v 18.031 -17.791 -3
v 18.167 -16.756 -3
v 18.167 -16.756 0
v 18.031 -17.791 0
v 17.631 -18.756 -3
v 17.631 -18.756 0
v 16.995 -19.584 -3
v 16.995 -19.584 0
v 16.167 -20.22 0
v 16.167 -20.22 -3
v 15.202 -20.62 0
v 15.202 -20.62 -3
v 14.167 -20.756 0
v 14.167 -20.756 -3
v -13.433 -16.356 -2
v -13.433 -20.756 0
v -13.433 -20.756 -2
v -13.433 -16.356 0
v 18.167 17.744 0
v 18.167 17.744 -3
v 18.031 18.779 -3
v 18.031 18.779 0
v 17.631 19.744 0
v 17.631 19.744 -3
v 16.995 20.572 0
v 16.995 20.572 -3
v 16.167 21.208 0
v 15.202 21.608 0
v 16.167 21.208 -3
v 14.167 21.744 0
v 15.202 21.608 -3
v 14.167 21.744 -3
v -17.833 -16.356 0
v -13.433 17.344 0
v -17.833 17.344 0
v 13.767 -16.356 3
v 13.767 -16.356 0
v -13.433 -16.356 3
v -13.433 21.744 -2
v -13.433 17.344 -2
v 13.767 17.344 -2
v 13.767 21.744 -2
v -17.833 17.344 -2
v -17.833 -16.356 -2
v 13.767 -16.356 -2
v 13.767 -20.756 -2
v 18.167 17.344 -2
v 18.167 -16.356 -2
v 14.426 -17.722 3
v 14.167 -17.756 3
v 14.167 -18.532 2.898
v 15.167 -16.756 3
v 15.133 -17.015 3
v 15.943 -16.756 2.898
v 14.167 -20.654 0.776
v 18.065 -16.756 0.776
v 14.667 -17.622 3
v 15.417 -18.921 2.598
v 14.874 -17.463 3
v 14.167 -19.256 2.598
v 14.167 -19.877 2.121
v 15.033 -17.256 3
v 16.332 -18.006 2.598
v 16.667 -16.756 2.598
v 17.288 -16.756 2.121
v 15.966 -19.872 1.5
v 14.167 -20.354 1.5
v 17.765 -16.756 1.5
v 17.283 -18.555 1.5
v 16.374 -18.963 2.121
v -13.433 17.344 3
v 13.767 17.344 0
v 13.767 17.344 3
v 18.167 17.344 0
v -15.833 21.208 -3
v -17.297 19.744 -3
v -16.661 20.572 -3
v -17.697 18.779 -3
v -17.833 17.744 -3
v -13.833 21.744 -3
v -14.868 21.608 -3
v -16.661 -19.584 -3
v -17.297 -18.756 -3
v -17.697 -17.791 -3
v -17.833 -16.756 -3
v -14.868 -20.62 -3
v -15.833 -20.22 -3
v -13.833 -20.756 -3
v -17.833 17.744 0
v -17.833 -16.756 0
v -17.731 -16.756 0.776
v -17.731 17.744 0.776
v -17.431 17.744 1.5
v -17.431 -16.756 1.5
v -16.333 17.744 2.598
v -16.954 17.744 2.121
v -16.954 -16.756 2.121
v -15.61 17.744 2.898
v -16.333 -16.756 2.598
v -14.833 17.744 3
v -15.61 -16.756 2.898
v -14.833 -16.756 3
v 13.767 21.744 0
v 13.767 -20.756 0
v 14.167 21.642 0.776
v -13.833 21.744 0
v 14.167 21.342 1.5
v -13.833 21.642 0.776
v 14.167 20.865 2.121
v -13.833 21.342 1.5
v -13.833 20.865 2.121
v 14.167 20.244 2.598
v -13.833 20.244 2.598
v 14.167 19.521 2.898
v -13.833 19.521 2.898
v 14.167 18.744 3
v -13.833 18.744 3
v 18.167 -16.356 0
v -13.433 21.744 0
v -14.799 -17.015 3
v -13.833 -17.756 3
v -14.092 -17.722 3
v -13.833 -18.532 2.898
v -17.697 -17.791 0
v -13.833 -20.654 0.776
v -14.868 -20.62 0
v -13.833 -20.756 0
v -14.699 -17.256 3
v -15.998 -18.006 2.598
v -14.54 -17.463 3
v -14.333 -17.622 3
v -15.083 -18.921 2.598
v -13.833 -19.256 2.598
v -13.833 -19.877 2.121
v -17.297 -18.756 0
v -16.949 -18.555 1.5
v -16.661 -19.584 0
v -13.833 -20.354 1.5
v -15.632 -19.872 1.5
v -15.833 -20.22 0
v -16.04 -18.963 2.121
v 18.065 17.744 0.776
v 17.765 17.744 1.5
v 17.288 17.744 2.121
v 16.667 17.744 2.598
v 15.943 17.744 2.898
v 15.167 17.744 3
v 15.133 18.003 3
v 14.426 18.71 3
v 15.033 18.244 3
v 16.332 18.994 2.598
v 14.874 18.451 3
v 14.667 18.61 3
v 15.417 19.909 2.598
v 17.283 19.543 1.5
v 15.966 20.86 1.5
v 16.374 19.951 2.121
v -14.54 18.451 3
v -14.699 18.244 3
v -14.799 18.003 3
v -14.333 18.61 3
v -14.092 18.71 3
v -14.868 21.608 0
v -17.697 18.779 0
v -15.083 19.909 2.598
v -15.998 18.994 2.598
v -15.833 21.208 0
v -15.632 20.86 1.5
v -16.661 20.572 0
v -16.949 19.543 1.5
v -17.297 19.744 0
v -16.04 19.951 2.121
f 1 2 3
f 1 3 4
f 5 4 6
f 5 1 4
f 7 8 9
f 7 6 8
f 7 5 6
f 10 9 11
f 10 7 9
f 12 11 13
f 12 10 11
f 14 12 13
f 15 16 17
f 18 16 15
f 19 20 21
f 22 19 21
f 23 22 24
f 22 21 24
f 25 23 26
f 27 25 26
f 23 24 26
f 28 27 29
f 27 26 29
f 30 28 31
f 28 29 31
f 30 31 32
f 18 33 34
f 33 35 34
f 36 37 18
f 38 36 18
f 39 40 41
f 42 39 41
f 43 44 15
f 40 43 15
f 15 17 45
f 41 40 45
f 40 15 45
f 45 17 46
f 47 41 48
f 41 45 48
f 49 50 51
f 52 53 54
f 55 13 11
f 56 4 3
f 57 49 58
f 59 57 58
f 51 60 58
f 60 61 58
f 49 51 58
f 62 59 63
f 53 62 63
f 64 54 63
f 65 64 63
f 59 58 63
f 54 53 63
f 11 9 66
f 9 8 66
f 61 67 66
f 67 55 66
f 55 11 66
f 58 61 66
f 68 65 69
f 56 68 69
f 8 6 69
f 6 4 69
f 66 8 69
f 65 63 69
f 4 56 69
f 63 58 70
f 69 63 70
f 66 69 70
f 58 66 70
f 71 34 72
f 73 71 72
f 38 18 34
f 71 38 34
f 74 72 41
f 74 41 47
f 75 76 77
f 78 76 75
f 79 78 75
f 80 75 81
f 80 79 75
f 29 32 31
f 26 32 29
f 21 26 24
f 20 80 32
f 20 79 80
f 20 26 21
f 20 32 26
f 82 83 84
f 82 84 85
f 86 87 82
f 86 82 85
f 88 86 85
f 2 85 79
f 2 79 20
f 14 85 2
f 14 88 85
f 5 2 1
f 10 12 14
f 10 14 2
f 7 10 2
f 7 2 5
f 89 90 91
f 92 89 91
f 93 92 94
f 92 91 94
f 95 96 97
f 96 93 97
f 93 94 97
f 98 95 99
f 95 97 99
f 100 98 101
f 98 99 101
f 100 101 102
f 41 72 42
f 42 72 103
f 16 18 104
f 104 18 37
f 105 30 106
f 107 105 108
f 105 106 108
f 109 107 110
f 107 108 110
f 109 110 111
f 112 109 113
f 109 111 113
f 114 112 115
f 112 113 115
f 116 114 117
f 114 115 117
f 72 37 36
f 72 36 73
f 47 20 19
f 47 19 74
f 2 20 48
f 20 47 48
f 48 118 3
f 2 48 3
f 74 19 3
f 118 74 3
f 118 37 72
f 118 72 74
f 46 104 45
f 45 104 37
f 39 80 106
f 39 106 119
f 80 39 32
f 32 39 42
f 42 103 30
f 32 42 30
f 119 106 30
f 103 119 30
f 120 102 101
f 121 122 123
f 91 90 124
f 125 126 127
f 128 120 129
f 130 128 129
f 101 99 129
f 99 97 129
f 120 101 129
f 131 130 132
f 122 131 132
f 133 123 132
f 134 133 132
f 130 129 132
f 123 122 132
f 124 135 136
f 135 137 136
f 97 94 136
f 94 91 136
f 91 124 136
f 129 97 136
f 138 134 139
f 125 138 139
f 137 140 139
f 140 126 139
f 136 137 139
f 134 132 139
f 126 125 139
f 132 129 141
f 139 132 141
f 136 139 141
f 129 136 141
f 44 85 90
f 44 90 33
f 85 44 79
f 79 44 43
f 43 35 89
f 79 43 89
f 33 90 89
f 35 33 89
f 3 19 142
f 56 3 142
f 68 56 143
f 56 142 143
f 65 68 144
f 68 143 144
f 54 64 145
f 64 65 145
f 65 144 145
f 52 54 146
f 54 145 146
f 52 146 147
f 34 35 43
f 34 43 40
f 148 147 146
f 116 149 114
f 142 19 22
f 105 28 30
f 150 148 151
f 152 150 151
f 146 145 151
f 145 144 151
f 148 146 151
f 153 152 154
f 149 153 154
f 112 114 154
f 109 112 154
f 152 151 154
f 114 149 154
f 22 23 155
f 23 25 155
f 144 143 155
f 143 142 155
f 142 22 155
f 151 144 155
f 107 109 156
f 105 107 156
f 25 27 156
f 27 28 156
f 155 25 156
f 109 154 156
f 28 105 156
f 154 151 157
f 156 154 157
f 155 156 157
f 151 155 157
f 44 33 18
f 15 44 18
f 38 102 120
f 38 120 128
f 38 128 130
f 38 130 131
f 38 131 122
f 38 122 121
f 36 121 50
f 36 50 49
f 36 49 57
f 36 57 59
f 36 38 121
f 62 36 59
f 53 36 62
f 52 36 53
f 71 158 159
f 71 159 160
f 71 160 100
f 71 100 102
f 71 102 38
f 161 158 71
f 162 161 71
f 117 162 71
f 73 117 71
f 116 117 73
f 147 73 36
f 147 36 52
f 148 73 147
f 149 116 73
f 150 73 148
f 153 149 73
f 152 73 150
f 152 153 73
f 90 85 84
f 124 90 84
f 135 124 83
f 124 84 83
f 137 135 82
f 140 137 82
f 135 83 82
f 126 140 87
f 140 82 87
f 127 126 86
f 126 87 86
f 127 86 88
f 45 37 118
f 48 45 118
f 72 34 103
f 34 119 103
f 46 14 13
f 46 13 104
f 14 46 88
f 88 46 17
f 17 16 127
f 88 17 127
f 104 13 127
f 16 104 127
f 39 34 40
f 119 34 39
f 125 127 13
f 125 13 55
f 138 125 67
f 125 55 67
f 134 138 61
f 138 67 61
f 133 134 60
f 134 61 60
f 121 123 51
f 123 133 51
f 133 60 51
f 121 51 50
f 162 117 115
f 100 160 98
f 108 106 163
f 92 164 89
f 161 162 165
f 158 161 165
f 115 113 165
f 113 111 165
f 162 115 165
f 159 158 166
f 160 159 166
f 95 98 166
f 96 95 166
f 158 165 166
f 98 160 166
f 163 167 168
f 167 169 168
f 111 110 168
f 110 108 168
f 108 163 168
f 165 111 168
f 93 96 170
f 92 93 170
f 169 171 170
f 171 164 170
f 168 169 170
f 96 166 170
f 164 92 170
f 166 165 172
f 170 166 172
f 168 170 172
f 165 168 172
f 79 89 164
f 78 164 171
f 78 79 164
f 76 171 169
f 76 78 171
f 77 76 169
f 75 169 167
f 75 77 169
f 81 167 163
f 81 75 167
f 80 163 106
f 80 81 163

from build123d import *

# Parameters (mm, degrees)
F0_W         = 27.2
F0_H         = 4.4
F0_W_2       = 4.4
F0_H_2       = 33.7
F1_DEPTH     = 3
F2_R         = 2.99999
F3_DEPTH     = 2
F4_W         = 4.4
F4_H         = 4.4
F5_DEPTH     = 1
F6_T1_DEPTH  = 16
F6_T4_ANGLE  = 90
F6_T6_ANGLE  = 90
F6_T8_ANGLE  = 90
F6_T10_ANGLE = 90


# Not quite as in the source:
# - a fillet or chamfer that OpenCascade refuses, or shapes differently, is made with other operations: its cross-section is extruded or revolved along the edge and cut away or added
# - a fillet or chamfer is up to 0.001 mm smaller than in the source, because OpenCascade refuses the exact size


with BuildPart() as f1:
    # F0 (on Top) → F1 (new body)
    with BuildSketch(Plane.XY):
        with Locations((0.1669520199, 19.5440534235)):
            Rectangle(F0_W, F0_H)
        with Locations((-15.6330479801, 0.4940534235)):
            Rectangle(F0_W_2, F0_H_2)
        with Locations((-15.6330479801, 19.5440534235)):
            Rectangle(F0_W_2, F0_H)
        with Locations((-15.6330479801, -18.5559465765)):
            Rectangle(F0_W_2, F0_H)
        with Locations((0.1669520199, -18.5559465765)):
            Rectangle(F0_W, F0_H)
        with Locations((15.9669520199, -18.5559465765)):
            Rectangle(F0_W_2, F0_H)
        with Locations((15.9669520199, 0.4940534235)):
            Rectangle(F0_W_2, F0_H_2)
        with Locations((15.9669520199, 19.5440534235)):
            Rectangle(F0_W_2, F0_H)
    extrude(amount=F1_DEPTH)

    # F2 (radius 3 in the source; OpenCascade refuses exactly that, so slightly less here)
    f2_edges = [f1.edges().sort_by_distance(p)[0] for p in [
        (18.166952, 0.494053, 3),
        (0.166952, 21.744053, 3),
        (-17.833048, 0.494053, 3),
        (0.166952, -20.755947, 3),
    ]]
    fillet(f2_edges, radius=F2_R)

    # F0 (on Top) → F3 (join)
    with BuildSketch(Plane.XY):
        with Locations((-15.6330479801, -18.5559465765)):
            Rectangle(F0_W_2, F0_H)
        with Locations((15.9669520199, -18.5559465765)):
            Rectangle(F0_W_2, F0_H)
        with Locations((15.9669520199, 19.5440534235)):
            Rectangle(F0_W_2, F0_H)
        with Locations((-15.6330479801, 19.5440534235)):
            Rectangle(F0_W_2, F0_H)
    extrude(amount=-F3_DEPTH)

    # F4 (on face) → F5 (join)
    with BuildSketch(Plane(origin=(0, 0, -2), x_dir=(1, 0, 0), z_dir=(0, 0, -1))):
        Polygon((-13.4330479801, -21.7440534235), (18.1669520199, -21.7440534235), (18.1669520199, 20.7559465765), (-17.8330479801, 20.7559465765), (-17.8330479801, -17.3440534235), (-13.4330479801, -17.3440534235), align=None)
        with Locations((-15.6330479801, -19.5440534235)):
            Rectangle(F4_W, F4_H)
    extrude(amount=F5_DEPTH)

    # F6: fillet of radius 4 on 4 edges, made by hand

    # F6_s2 → F6_t1 (cut)
    with BuildSketch(Plane.XY.offset(-13)):
        with BuildLine():
            ThreePointArc((18.1669520199, 17.7440534235), (16.9953791447, 20.5724805482), (14.1669520199, 21.7440534235))
            Line((14.1669520199, 21.7440534235), (18.1669520199, 21.7440534235))
            Line((18.1669520199, 21.7440534235), (18.1669520199, 17.7440534235))
        make_face()
        with BuildLine():
            ThreePointArc((18.1669520199, -16.7559465765), (16.9953791447, -19.5843737013), (14.1669520199, -20.7559465765))
            Line((14.1669520199, -20.7559465765), (18.1669520199, -20.7559465765))
            Line((18.1669520199, -20.7559465765), (18.1669520199, -16.7559465765))
        make_face()
        with BuildLine():
            ThreePointArc((-17.8330479801, -16.7559465765), (-16.6614751048, -19.5843737013), (-13.8330479801, -20.7559465765))
            Line((-13.8330479801, -20.7559465765), (-17.8330479801, -20.7559465765))
            Line((-17.8330479801, -20.7559465765), (-17.8330479801, -16.7559465765))
        make_face()
        with BuildLine():
            ThreePointArc((-17.8330479801, 17.7440534235), (-16.6614751048, 20.5724805482), (-13.8330479801, 21.7440534235))
            Line((-13.8330479801, 21.7440534235), (-17.8330479801, 21.7440534235))
            Line((-17.8330479801, 21.7440534235), (-17.8330479801, 17.7440534235))
        make_face()
    extrude(amount=F6_T1_DEPTH, mode=Mode.SUBTRACT)

    # F6_s3 → F6_t4 (revolve, cut)
    with BuildSketch(Plane.YZ.offset(-13.8330479801)):
        with BuildLine():
            ThreePointArc((18.7440634235, 3), (20.8653766959, 2.1213232725), (21.7440534235, 1e-05))
            Line((21.7440534235, 1e-05), (21.7440534235, 3))
            Line((21.7440534235, 3), (18.7440634235, 3))
        make_face()
    revolve(axis=Axis((-13.8330479801, 17.7440534235, 3), (0, 0, 1)), revolution_arc=F6_T4_ANGLE, mode=Mode.SUBTRACT)

    # F6_s5 → F6_t6 (revolve, cut)
    with BuildSketch(Plane.XZ.offset(16.7559465765)):
        with BuildLine():
            ThreePointArc((-14.8330579801, 3), (-16.9543712526, 2.1213232725), (-17.8330479801, 1e-05))
            Line((-17.8330479801, 1e-05), (-17.8330479801, 3))
            Line((-17.8330479801, 3), (-14.8330579801, 3))
        make_face()
    revolve(axis=Axis((-13.8330479801, -16.7559465765, 3), (0, 0, 1)), revolution_arc=F6_T6_ANGLE, mode=Mode.SUBTRACT)

    # F6_s7 → F6_t8 (revolve, cut)
    with BuildSketch(Plane.YZ.offset(14.1669520199)):
        with BuildLine():
            ThreePointArc((-17.7559565765, 3), (-19.877269849, 2.1213232725), (-20.7559465765, 1e-05))
            Line((-20.7559465765, 1e-05), (-20.7559465765, 3))
            Line((-20.7559465765, 3), (-17.7559565765, 3))
        make_face()
    revolve(axis=Axis((14.1669520199, -16.7559465765, 3), (0, 0, 1)), revolution_arc=F6_T8_ANGLE, mode=Mode.SUBTRACT)

    # F6_s9 → F6_t10 (revolve, cut)
    with BuildSketch(Plane.XZ.offset(-17.7440534235)):
        with BuildLine():
            ThreePointArc((15.1669620199, 3), (17.2882752924, 2.1213232725), (18.1669520199, 1e-05))
            Line((18.1669520199, 1e-05), (18.1669520199, 3))
            Line((18.1669520199, 3), (15.1669620199, 3))
        make_face()
    revolve(axis=Axis((14.1669520199, 17.7440534235, 3), (0, 0, 1)), revolution_arc=F6_T10_ANGLE, mode=Mode.SUBTRACT)


solid = f1.part
